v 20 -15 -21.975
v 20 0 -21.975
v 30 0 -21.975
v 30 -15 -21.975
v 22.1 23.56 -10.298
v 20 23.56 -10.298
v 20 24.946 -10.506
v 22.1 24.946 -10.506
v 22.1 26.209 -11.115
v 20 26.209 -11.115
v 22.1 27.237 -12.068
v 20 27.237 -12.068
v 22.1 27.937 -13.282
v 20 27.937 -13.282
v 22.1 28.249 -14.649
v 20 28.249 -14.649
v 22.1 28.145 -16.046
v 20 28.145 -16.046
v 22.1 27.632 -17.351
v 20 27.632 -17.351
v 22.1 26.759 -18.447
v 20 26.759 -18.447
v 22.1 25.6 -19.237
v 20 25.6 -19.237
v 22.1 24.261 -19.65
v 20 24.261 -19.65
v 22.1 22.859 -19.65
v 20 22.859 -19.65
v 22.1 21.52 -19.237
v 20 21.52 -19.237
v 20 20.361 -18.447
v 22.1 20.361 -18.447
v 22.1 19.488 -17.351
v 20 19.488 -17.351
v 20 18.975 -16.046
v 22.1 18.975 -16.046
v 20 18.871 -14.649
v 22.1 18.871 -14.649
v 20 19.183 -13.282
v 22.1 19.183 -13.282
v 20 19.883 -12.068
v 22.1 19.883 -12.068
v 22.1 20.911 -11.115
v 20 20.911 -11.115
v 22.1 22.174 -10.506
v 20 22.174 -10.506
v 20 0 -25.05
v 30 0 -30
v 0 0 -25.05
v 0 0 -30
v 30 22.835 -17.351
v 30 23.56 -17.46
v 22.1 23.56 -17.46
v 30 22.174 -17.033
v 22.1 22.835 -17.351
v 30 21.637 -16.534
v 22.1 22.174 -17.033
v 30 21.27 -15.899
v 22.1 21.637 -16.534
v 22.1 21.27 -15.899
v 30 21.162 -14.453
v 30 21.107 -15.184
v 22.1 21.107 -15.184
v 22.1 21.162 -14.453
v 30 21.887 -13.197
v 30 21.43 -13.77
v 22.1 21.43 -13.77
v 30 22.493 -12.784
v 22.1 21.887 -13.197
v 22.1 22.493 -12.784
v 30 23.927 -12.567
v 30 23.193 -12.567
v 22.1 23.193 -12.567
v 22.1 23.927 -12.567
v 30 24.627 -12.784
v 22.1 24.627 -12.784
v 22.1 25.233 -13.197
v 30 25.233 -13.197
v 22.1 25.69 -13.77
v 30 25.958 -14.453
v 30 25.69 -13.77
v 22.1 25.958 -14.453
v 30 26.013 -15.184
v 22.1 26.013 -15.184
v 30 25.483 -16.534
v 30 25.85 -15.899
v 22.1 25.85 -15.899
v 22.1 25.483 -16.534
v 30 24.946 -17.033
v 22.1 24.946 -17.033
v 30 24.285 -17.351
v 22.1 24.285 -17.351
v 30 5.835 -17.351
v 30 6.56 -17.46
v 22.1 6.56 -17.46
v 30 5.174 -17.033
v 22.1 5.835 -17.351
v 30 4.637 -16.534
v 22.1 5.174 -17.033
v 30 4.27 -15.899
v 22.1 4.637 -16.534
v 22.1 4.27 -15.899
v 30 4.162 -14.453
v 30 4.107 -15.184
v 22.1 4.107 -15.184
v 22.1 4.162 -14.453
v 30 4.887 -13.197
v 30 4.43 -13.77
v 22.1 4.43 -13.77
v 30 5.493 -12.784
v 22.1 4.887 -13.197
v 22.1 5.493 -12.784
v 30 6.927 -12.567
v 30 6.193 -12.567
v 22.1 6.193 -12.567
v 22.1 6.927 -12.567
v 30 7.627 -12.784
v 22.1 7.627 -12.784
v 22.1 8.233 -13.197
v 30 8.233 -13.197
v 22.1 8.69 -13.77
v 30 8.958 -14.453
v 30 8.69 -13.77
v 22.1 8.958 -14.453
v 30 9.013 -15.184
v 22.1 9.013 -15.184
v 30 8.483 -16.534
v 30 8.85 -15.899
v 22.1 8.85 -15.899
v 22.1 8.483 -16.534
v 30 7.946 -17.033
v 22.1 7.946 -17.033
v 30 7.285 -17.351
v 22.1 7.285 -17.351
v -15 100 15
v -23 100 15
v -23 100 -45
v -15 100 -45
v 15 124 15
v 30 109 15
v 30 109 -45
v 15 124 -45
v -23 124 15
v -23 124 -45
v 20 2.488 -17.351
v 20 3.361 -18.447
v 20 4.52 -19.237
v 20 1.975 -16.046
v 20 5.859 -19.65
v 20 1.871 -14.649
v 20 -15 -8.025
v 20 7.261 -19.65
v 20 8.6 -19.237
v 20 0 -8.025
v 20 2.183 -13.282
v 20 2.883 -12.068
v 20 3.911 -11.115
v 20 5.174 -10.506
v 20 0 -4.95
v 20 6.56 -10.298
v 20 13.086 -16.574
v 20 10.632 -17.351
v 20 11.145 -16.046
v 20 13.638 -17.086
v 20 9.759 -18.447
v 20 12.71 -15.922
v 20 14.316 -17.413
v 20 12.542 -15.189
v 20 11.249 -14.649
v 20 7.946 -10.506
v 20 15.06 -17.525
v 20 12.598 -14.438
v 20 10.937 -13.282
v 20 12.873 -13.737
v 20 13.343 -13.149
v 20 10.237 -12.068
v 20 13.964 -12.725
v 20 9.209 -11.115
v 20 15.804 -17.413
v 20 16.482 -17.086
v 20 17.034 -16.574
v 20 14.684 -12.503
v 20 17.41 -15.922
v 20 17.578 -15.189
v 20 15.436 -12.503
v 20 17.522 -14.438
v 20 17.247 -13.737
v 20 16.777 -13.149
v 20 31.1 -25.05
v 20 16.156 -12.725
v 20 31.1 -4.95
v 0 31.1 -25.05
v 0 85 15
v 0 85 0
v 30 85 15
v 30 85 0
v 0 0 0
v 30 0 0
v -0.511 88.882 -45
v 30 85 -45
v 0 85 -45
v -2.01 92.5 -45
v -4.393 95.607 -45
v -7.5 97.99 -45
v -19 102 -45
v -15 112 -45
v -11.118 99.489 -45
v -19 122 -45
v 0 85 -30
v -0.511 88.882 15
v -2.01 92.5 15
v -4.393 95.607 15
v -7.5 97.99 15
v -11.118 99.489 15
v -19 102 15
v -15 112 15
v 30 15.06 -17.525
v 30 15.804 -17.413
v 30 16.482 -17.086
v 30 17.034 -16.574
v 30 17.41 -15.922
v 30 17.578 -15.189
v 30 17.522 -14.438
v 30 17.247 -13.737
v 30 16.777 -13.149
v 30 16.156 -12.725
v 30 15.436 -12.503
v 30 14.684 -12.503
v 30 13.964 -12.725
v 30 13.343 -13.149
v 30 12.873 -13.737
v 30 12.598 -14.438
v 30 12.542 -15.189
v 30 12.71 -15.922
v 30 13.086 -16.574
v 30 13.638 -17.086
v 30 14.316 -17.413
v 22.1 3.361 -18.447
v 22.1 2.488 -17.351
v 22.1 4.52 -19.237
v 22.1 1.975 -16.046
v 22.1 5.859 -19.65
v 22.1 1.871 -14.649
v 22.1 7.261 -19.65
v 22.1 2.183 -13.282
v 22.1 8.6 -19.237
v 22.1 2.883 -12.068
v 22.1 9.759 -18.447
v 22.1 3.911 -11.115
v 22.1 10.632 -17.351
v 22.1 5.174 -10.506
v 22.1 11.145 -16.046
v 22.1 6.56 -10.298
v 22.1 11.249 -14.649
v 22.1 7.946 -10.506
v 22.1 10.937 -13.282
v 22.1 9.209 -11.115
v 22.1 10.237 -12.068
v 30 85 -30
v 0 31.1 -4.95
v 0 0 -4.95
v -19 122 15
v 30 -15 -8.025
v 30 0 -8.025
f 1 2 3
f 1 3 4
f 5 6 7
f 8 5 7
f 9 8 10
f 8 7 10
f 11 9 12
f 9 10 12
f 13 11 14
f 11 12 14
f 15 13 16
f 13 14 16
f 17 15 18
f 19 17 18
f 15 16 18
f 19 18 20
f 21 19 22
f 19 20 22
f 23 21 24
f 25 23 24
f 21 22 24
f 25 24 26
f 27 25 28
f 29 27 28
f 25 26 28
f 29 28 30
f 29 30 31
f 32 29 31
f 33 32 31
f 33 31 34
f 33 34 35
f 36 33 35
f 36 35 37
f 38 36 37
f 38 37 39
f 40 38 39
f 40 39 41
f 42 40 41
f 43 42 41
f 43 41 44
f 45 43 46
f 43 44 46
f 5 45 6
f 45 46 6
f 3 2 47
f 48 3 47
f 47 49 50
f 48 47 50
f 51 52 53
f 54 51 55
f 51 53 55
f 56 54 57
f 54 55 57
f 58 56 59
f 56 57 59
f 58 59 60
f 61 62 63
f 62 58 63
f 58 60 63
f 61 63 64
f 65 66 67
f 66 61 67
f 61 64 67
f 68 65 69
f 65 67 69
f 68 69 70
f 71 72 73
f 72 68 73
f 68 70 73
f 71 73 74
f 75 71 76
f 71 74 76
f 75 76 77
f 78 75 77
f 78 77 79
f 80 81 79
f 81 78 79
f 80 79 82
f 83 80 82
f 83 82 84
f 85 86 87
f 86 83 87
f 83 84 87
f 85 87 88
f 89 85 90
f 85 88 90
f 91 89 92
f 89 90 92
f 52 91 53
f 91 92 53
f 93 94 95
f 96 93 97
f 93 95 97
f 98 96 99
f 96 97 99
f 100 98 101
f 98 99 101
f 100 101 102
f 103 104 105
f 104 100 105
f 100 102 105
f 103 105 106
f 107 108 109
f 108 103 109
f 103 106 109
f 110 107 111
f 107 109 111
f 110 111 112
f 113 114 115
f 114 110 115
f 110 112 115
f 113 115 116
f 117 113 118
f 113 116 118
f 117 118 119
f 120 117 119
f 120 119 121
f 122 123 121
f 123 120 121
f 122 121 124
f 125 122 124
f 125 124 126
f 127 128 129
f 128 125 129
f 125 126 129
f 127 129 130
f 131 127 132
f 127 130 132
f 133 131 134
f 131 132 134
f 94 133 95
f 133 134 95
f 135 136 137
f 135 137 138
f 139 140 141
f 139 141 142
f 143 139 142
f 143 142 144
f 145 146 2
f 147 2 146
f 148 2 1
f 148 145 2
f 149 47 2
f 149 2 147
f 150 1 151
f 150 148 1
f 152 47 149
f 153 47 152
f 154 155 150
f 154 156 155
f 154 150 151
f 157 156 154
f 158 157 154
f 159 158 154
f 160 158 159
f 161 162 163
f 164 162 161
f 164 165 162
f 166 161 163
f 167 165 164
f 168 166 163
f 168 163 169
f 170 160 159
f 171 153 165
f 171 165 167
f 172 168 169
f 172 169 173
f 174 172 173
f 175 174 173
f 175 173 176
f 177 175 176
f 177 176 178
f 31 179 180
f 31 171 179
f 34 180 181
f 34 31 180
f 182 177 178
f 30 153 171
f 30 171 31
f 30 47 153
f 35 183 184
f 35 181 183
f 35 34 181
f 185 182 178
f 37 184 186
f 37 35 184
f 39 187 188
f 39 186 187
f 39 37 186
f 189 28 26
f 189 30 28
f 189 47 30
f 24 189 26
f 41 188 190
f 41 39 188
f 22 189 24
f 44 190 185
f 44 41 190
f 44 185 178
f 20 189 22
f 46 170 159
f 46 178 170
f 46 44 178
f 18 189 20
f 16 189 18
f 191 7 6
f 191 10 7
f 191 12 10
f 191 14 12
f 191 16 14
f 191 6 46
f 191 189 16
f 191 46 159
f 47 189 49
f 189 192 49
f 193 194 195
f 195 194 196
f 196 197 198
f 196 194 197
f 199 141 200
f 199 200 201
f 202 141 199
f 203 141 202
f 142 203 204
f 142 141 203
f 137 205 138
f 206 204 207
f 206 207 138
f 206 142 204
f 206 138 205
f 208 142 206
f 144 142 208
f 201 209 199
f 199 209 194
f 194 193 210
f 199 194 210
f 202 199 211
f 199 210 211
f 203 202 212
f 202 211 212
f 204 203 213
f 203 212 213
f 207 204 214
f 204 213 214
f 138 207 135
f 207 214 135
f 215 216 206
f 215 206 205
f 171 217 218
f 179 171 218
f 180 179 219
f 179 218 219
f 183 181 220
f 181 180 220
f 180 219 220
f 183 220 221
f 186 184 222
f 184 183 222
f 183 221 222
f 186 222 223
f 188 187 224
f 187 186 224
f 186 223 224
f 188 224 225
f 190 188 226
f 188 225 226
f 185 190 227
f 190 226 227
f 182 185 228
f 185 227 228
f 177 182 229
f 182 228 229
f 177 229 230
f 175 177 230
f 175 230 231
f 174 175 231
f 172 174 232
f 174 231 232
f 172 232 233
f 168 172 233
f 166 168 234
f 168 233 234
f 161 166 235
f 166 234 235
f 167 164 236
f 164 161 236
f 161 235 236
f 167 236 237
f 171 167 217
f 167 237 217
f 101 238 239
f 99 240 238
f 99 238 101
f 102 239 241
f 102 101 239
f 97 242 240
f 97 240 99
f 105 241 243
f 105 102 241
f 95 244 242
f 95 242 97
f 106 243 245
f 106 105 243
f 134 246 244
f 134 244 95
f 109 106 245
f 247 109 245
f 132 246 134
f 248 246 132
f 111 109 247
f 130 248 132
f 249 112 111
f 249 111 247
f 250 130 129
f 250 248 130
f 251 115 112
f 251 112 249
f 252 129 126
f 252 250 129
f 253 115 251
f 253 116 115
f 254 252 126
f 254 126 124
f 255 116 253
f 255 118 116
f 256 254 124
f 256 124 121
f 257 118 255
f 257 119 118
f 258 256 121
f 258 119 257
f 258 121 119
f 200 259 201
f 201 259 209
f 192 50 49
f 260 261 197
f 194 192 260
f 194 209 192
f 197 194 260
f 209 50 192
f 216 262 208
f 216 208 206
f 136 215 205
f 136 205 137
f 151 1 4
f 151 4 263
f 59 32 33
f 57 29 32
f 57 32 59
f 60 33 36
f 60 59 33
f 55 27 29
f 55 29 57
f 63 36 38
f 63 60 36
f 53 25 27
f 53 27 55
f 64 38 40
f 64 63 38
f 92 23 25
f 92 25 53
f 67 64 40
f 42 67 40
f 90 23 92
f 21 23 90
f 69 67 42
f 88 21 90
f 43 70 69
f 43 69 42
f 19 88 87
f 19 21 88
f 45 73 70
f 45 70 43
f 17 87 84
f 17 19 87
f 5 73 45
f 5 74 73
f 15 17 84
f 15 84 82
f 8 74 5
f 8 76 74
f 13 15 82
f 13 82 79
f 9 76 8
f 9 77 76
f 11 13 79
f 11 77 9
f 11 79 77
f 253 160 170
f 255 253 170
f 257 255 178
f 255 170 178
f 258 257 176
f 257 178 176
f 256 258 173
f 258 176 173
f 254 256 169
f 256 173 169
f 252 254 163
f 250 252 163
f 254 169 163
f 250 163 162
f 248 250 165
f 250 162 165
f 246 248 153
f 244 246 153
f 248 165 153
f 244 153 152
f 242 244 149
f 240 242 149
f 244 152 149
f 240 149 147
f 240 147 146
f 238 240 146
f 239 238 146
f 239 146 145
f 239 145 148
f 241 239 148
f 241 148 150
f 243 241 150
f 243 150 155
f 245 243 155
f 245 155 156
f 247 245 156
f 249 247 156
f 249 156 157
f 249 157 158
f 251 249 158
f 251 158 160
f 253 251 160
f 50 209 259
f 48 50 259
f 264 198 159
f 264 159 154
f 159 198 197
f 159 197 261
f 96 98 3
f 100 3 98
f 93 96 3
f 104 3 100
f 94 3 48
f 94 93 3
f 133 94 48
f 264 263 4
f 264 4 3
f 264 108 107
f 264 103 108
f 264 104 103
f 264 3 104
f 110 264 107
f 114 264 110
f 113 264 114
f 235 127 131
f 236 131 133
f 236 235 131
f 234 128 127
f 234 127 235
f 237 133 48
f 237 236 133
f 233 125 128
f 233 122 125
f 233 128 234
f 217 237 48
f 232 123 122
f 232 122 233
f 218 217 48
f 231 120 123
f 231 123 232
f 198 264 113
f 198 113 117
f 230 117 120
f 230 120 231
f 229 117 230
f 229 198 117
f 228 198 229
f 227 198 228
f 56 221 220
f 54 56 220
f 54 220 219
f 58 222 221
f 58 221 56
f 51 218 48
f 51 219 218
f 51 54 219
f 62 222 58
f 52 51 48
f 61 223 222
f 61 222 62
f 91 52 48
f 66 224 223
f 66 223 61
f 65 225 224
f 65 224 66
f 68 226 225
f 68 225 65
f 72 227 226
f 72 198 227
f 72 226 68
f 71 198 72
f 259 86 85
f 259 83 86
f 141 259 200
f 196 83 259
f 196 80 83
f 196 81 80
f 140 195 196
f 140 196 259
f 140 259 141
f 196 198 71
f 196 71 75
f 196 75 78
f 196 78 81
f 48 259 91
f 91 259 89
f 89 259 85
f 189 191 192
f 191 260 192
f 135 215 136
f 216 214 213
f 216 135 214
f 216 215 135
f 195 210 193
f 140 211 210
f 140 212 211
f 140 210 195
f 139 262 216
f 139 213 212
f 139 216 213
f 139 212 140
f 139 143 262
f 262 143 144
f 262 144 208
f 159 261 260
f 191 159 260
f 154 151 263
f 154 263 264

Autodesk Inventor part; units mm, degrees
ref_plane "YZ Plane" through (0, 0, 0) normal (1, 0, 0) x (0, 1, 0)
ref_plane "XZ Plane" through (0, 0, 0) normal (0, 1, 0) x (-1, 0, 0)
sketch "Sketch1" plane through (0, 0, 0) normal (0, 0, 1) x (1, 0, 0)
  line L0 (0, 0) -> (25, 0)
  line L1 (25, 0) -> (25, 40)
  line L2 (25, 40) -> (0, 40)
  line L3 (0, 40) -> (0, 0)
  dimension "d1" = 25
  dimension "d2" = 40
  dimension "d3" = 25
extrude "Extrusion1" add sketch "Sketch1" against normal blind 30
sketch "Sketch2" plane through (25, 0, 0) normal (1, 0, 0) x (0, 0, -1)
  line L0 (0, 0) -> (30, 0) projected
  circle A0 centre (15, 6.56) radius 2.46
extrude "Extrusion2" cut sketch "Sketch2" against normal blind 30
sketch "Sketch3" plane through (0, 0, 0) normal (-1, 0, 0) x (0, 0, 1)
  line L0 (0, 0) -> (-30, 0) projected
  line L1 (-25.05, 0) -> (-4.95, 0)
  line L2 (-4.95, 0) -> (-4.95, 33.12)
  line L3 (-4.95, 33.12) -> (-25.05, 33.12)
  line L4 (-25.05, 33.12) -> (-25.05, 0)
  dimension "d11" = 20.1
extrude "Extrusion3" cut sketch "Sketch3" against normal blind 20
sketch "Sketch4" plane through (0, 0, 0) normal (0, -1, 0) x (1, 0, 0)
  line L0 (20, -4.95) -> (20, -25.05) projected
  line L1 (20, -15) -> (25, -15)
  line L2 (25, 0) -> (25, -30) projected
  line L3 (20, -8.025) -> (25, -8.025)
  line L4 (25, -8.025) -> (25, -21.975)
  line L5 (25, -21.975) -> (20, -21.975)
  line L6 (20, -21.975) -> (20, -8.025)
  line L7 (20, -8.025) -> (25, -21.975) construction
  line L8 (25, -8.025) -> (20, -21.975) construction
  line L9 (25, -12.54) -> (25, -17.46) projected
  point P0 (0, 0)
  point P1 (22.5, -15)
  dimension "d14" = 13.95
extrude "Extrusion4" add sketch "Sketch4" along normal blind 15
sketch "Sketch5" plane through (20, 0, 0) normal (-1, 0, 0) x (0, 0, 1)
  circle A0 centre (-15, 6.56) radius 2.46 projected
  circle A1 centre (-15, 6.56) radius 4.7025
  circle A2 centre (-15, 6.56) radius 2.46 projected
  circle A3 centre (-15, 6.56) radius 2.46
  point P0 (0, 0)
  dimension "d17" = 9.405
extrude "Extrusion5" cut sketch "Sketch5" against normal blind 2.1
sketch "Sketch6" plane through (25, 0, 0) normal (1, 0, 0) x (0, 0, -1)
  circle A0 centre (15, 6.56) radius 4.7025 projected
  line L0 (15, 6.56) -> (15, 23.56)
  circle A1 centre (15, 23.56) radius 2.46
  point P0 (0, 0)
  dimension "d20" = 17
  dimension "d21" = 4.92
extrude "Extrusion6" cut sketch "Sketch6" against normal blind 10 contours A1
sketch "Sketch7" plane through (20, 0, 0) normal (-1, 0, 0) x (0, 0, 1)
  circle A0 centre (-15, 23.56) radius 2.46 projected
  circle A1 centre (-15, 23.56) radius 4.7025
  point P0 (0, 0)
  dimension "d24" = 9.405
extrude "Extrusion7" cut sketch "Sketch7" against normal blind 2.1
sketch "Sketch9" plane through (25, 0, 0) normal (1, 0, 0) x (0, 0, -1)
  circle A0 centre (15, 6.56) radius 2.46 projected
  circle A1 centre (15, 6.56) radius 2.46
  circle A2 centre (15, 23.56) radius 2.46 projected
  circle A3 centre (15, 23.56) radius 2.46
  line L0 (30, 40) -> (30, 0) projected
  line L1 (30, 0) -> (30, 40)
  line L2 (30, 40) -> (0, 40)
  line L3 (0, 40) -> (0, 0)
  line L4 (0, 0) -> (8.025, 0) projected
  line L5 (21.975, 0) -> (21.975, -15)
  line L6 (21.975, -15) -> (8.025, -15)
  line L7 (8.025, -15) -> (8.025, 0)
  line L8 (0, 0) -> (8.025, 0)
  line L9 (21.975, 0) -> (30, 0)
extrude "Extrusion8" add sketch "Sketch9" along normal blind 5
sketch "Sketch10" plane through (0, 40, 0) normal (0, 1, 0) x (1, 0, 0)
  line L0 (0, 30) -> (30, 30) projected
  line L1 (30, 0) -> (0, 0) projected
  line L2 (0, 30) -> (30, 30)
  line L3 (30, 30) -> (30, 0)
  line L4 (30, 0) -> (0, 0)
  line L5 (0, 0) -> (0, 30)
extrude "Extrusion9" add sketch "Sketch10" along normal blind 30
sketch "Sketch12" plane through (30, 0, 0) normal (1, 0, 0) x (0, 0, -1)
  circle A0 centre (15, 6.56) radius 2.46 projected
  line L0 (15, 6.56) -> (15, 15.06)
  circle A1 centre (15, 15.06) radius 2.525
  point P0 (0, 0)
  dimension "d31" = 8.5
  dimension "d33" = 5.05
extrude "Extrusion10" cut sketch "Sketch12" against normal blind 30 contours A1
sketch "Sketch14" plane through (0, 0, 0) normal (0, 0, 1) x (1, 0, 0)
  line L0 (30, 70) -> (0, 70) projected
  line L1 (0, 70) -> (0, 85)
  line L2 (-15, 100) -> (-23, 100)
  line L3 (30, 0) -> (30, 70) projected
  line L4 (30, 109) -> (30, 70)
  arc A0 (0, 85) -> (-15, 100) centre (-15, 85) ccw
  line L5 (30, 105) -> (30, 100)
  line L6 (-23, 124) -> (15, 124)
  line L7 (-19, 122) -> (-23, 124)
  line L8 (-19, 122) -> (-15, 112)
  line L9 (-19, 102) -> (-23, 100)
  line L10 (-19, 102) -> (-15, 112)
  line L11 (30, 109) -> (15, 124)
  point P0 (0, 0)
  point P1 (0, 100)
  dimension "d47" = 30
  dimension "d54" = 15
extrude "Extrusion12" add sketch "Sketch14" against normal blind 30
sketch "Sketch15" plane through (0, 0, -25.05) normal (-1, 0, 0) x (0, 0, 1)
  line L0 (0, 33.12) -> (20.1, 33.12) projected
  line L1 (20.1, 33.12) -> (20.1, 0) projected
  line L2 (0, 33.12) -> (20.1, 33.12)
  line L3 (20.1, 33.12) -> (20.1, 31.1)
  line L4 (20.1, 31.1) -> (0, 31.1)
  line L5 (0, 31.1) -> (0, 33.12)
  point P0 (25.05, 0)
  dimension "d57" = 2.02
extrude "Extrusion13" add sketch "Sketch15" against normal blind 20
sketch "Sketch19" plane through (0, 0, 0) normal (0, 0, 1) x (1, 0, 0)
  arc A0 (0, 85) -> (-15, 100) centre (-15, 85) ccw projected
  arc A1 (0, 85) -> (-15, 100) centre (-15, 85) ccw
  line L0 (-15, 100) -> (-23, 100) projected
  line L1 (-15, 100) -> (-23, 100)
  line L2 (-23, 100) -> (-19, 102) projected
  line L3 (-23, 100) -> (-19, 102)
  line L4 (-19, 102) -> (-15, 112) projected
  line L5 (-19, 102) -> (-15, 112)
  line L6 (-15, 112) -> (-19, 122) projected
  line L7 (-15, 112) -> (-19, 122)
  line L8 (-19, 122) -> (-23, 124) projected
  line L9 (-19, 122) -> (-23, 124)
  line L10 (-23, 124) -> (15, 124) projected
  line L11 (-23, 124) -> (15, 124)
  line L12 (15, 124) -> (30, 109) projected
  line L13 (15, 124) -> (30, 109)
  line L14 (30, 109) -> (30, 85)
  line L15 (30, 0) -> (30, 109) projected
  line L16 (0, 85) -> (30, 85)
  point P0 (0, 0)
extrude "Extrusion14" add sketch "Sketch19" along normal blind 15
ref_plane "Work Plane1" through (0, 0, -15) normal (0, 0, 1) x (1, 0, 0)
mirror "Mirror1" about plane through (0, 0, -15) normal (0, 0, 1) of "Extrusion14"
properties part number "20mm_x_60mm"
